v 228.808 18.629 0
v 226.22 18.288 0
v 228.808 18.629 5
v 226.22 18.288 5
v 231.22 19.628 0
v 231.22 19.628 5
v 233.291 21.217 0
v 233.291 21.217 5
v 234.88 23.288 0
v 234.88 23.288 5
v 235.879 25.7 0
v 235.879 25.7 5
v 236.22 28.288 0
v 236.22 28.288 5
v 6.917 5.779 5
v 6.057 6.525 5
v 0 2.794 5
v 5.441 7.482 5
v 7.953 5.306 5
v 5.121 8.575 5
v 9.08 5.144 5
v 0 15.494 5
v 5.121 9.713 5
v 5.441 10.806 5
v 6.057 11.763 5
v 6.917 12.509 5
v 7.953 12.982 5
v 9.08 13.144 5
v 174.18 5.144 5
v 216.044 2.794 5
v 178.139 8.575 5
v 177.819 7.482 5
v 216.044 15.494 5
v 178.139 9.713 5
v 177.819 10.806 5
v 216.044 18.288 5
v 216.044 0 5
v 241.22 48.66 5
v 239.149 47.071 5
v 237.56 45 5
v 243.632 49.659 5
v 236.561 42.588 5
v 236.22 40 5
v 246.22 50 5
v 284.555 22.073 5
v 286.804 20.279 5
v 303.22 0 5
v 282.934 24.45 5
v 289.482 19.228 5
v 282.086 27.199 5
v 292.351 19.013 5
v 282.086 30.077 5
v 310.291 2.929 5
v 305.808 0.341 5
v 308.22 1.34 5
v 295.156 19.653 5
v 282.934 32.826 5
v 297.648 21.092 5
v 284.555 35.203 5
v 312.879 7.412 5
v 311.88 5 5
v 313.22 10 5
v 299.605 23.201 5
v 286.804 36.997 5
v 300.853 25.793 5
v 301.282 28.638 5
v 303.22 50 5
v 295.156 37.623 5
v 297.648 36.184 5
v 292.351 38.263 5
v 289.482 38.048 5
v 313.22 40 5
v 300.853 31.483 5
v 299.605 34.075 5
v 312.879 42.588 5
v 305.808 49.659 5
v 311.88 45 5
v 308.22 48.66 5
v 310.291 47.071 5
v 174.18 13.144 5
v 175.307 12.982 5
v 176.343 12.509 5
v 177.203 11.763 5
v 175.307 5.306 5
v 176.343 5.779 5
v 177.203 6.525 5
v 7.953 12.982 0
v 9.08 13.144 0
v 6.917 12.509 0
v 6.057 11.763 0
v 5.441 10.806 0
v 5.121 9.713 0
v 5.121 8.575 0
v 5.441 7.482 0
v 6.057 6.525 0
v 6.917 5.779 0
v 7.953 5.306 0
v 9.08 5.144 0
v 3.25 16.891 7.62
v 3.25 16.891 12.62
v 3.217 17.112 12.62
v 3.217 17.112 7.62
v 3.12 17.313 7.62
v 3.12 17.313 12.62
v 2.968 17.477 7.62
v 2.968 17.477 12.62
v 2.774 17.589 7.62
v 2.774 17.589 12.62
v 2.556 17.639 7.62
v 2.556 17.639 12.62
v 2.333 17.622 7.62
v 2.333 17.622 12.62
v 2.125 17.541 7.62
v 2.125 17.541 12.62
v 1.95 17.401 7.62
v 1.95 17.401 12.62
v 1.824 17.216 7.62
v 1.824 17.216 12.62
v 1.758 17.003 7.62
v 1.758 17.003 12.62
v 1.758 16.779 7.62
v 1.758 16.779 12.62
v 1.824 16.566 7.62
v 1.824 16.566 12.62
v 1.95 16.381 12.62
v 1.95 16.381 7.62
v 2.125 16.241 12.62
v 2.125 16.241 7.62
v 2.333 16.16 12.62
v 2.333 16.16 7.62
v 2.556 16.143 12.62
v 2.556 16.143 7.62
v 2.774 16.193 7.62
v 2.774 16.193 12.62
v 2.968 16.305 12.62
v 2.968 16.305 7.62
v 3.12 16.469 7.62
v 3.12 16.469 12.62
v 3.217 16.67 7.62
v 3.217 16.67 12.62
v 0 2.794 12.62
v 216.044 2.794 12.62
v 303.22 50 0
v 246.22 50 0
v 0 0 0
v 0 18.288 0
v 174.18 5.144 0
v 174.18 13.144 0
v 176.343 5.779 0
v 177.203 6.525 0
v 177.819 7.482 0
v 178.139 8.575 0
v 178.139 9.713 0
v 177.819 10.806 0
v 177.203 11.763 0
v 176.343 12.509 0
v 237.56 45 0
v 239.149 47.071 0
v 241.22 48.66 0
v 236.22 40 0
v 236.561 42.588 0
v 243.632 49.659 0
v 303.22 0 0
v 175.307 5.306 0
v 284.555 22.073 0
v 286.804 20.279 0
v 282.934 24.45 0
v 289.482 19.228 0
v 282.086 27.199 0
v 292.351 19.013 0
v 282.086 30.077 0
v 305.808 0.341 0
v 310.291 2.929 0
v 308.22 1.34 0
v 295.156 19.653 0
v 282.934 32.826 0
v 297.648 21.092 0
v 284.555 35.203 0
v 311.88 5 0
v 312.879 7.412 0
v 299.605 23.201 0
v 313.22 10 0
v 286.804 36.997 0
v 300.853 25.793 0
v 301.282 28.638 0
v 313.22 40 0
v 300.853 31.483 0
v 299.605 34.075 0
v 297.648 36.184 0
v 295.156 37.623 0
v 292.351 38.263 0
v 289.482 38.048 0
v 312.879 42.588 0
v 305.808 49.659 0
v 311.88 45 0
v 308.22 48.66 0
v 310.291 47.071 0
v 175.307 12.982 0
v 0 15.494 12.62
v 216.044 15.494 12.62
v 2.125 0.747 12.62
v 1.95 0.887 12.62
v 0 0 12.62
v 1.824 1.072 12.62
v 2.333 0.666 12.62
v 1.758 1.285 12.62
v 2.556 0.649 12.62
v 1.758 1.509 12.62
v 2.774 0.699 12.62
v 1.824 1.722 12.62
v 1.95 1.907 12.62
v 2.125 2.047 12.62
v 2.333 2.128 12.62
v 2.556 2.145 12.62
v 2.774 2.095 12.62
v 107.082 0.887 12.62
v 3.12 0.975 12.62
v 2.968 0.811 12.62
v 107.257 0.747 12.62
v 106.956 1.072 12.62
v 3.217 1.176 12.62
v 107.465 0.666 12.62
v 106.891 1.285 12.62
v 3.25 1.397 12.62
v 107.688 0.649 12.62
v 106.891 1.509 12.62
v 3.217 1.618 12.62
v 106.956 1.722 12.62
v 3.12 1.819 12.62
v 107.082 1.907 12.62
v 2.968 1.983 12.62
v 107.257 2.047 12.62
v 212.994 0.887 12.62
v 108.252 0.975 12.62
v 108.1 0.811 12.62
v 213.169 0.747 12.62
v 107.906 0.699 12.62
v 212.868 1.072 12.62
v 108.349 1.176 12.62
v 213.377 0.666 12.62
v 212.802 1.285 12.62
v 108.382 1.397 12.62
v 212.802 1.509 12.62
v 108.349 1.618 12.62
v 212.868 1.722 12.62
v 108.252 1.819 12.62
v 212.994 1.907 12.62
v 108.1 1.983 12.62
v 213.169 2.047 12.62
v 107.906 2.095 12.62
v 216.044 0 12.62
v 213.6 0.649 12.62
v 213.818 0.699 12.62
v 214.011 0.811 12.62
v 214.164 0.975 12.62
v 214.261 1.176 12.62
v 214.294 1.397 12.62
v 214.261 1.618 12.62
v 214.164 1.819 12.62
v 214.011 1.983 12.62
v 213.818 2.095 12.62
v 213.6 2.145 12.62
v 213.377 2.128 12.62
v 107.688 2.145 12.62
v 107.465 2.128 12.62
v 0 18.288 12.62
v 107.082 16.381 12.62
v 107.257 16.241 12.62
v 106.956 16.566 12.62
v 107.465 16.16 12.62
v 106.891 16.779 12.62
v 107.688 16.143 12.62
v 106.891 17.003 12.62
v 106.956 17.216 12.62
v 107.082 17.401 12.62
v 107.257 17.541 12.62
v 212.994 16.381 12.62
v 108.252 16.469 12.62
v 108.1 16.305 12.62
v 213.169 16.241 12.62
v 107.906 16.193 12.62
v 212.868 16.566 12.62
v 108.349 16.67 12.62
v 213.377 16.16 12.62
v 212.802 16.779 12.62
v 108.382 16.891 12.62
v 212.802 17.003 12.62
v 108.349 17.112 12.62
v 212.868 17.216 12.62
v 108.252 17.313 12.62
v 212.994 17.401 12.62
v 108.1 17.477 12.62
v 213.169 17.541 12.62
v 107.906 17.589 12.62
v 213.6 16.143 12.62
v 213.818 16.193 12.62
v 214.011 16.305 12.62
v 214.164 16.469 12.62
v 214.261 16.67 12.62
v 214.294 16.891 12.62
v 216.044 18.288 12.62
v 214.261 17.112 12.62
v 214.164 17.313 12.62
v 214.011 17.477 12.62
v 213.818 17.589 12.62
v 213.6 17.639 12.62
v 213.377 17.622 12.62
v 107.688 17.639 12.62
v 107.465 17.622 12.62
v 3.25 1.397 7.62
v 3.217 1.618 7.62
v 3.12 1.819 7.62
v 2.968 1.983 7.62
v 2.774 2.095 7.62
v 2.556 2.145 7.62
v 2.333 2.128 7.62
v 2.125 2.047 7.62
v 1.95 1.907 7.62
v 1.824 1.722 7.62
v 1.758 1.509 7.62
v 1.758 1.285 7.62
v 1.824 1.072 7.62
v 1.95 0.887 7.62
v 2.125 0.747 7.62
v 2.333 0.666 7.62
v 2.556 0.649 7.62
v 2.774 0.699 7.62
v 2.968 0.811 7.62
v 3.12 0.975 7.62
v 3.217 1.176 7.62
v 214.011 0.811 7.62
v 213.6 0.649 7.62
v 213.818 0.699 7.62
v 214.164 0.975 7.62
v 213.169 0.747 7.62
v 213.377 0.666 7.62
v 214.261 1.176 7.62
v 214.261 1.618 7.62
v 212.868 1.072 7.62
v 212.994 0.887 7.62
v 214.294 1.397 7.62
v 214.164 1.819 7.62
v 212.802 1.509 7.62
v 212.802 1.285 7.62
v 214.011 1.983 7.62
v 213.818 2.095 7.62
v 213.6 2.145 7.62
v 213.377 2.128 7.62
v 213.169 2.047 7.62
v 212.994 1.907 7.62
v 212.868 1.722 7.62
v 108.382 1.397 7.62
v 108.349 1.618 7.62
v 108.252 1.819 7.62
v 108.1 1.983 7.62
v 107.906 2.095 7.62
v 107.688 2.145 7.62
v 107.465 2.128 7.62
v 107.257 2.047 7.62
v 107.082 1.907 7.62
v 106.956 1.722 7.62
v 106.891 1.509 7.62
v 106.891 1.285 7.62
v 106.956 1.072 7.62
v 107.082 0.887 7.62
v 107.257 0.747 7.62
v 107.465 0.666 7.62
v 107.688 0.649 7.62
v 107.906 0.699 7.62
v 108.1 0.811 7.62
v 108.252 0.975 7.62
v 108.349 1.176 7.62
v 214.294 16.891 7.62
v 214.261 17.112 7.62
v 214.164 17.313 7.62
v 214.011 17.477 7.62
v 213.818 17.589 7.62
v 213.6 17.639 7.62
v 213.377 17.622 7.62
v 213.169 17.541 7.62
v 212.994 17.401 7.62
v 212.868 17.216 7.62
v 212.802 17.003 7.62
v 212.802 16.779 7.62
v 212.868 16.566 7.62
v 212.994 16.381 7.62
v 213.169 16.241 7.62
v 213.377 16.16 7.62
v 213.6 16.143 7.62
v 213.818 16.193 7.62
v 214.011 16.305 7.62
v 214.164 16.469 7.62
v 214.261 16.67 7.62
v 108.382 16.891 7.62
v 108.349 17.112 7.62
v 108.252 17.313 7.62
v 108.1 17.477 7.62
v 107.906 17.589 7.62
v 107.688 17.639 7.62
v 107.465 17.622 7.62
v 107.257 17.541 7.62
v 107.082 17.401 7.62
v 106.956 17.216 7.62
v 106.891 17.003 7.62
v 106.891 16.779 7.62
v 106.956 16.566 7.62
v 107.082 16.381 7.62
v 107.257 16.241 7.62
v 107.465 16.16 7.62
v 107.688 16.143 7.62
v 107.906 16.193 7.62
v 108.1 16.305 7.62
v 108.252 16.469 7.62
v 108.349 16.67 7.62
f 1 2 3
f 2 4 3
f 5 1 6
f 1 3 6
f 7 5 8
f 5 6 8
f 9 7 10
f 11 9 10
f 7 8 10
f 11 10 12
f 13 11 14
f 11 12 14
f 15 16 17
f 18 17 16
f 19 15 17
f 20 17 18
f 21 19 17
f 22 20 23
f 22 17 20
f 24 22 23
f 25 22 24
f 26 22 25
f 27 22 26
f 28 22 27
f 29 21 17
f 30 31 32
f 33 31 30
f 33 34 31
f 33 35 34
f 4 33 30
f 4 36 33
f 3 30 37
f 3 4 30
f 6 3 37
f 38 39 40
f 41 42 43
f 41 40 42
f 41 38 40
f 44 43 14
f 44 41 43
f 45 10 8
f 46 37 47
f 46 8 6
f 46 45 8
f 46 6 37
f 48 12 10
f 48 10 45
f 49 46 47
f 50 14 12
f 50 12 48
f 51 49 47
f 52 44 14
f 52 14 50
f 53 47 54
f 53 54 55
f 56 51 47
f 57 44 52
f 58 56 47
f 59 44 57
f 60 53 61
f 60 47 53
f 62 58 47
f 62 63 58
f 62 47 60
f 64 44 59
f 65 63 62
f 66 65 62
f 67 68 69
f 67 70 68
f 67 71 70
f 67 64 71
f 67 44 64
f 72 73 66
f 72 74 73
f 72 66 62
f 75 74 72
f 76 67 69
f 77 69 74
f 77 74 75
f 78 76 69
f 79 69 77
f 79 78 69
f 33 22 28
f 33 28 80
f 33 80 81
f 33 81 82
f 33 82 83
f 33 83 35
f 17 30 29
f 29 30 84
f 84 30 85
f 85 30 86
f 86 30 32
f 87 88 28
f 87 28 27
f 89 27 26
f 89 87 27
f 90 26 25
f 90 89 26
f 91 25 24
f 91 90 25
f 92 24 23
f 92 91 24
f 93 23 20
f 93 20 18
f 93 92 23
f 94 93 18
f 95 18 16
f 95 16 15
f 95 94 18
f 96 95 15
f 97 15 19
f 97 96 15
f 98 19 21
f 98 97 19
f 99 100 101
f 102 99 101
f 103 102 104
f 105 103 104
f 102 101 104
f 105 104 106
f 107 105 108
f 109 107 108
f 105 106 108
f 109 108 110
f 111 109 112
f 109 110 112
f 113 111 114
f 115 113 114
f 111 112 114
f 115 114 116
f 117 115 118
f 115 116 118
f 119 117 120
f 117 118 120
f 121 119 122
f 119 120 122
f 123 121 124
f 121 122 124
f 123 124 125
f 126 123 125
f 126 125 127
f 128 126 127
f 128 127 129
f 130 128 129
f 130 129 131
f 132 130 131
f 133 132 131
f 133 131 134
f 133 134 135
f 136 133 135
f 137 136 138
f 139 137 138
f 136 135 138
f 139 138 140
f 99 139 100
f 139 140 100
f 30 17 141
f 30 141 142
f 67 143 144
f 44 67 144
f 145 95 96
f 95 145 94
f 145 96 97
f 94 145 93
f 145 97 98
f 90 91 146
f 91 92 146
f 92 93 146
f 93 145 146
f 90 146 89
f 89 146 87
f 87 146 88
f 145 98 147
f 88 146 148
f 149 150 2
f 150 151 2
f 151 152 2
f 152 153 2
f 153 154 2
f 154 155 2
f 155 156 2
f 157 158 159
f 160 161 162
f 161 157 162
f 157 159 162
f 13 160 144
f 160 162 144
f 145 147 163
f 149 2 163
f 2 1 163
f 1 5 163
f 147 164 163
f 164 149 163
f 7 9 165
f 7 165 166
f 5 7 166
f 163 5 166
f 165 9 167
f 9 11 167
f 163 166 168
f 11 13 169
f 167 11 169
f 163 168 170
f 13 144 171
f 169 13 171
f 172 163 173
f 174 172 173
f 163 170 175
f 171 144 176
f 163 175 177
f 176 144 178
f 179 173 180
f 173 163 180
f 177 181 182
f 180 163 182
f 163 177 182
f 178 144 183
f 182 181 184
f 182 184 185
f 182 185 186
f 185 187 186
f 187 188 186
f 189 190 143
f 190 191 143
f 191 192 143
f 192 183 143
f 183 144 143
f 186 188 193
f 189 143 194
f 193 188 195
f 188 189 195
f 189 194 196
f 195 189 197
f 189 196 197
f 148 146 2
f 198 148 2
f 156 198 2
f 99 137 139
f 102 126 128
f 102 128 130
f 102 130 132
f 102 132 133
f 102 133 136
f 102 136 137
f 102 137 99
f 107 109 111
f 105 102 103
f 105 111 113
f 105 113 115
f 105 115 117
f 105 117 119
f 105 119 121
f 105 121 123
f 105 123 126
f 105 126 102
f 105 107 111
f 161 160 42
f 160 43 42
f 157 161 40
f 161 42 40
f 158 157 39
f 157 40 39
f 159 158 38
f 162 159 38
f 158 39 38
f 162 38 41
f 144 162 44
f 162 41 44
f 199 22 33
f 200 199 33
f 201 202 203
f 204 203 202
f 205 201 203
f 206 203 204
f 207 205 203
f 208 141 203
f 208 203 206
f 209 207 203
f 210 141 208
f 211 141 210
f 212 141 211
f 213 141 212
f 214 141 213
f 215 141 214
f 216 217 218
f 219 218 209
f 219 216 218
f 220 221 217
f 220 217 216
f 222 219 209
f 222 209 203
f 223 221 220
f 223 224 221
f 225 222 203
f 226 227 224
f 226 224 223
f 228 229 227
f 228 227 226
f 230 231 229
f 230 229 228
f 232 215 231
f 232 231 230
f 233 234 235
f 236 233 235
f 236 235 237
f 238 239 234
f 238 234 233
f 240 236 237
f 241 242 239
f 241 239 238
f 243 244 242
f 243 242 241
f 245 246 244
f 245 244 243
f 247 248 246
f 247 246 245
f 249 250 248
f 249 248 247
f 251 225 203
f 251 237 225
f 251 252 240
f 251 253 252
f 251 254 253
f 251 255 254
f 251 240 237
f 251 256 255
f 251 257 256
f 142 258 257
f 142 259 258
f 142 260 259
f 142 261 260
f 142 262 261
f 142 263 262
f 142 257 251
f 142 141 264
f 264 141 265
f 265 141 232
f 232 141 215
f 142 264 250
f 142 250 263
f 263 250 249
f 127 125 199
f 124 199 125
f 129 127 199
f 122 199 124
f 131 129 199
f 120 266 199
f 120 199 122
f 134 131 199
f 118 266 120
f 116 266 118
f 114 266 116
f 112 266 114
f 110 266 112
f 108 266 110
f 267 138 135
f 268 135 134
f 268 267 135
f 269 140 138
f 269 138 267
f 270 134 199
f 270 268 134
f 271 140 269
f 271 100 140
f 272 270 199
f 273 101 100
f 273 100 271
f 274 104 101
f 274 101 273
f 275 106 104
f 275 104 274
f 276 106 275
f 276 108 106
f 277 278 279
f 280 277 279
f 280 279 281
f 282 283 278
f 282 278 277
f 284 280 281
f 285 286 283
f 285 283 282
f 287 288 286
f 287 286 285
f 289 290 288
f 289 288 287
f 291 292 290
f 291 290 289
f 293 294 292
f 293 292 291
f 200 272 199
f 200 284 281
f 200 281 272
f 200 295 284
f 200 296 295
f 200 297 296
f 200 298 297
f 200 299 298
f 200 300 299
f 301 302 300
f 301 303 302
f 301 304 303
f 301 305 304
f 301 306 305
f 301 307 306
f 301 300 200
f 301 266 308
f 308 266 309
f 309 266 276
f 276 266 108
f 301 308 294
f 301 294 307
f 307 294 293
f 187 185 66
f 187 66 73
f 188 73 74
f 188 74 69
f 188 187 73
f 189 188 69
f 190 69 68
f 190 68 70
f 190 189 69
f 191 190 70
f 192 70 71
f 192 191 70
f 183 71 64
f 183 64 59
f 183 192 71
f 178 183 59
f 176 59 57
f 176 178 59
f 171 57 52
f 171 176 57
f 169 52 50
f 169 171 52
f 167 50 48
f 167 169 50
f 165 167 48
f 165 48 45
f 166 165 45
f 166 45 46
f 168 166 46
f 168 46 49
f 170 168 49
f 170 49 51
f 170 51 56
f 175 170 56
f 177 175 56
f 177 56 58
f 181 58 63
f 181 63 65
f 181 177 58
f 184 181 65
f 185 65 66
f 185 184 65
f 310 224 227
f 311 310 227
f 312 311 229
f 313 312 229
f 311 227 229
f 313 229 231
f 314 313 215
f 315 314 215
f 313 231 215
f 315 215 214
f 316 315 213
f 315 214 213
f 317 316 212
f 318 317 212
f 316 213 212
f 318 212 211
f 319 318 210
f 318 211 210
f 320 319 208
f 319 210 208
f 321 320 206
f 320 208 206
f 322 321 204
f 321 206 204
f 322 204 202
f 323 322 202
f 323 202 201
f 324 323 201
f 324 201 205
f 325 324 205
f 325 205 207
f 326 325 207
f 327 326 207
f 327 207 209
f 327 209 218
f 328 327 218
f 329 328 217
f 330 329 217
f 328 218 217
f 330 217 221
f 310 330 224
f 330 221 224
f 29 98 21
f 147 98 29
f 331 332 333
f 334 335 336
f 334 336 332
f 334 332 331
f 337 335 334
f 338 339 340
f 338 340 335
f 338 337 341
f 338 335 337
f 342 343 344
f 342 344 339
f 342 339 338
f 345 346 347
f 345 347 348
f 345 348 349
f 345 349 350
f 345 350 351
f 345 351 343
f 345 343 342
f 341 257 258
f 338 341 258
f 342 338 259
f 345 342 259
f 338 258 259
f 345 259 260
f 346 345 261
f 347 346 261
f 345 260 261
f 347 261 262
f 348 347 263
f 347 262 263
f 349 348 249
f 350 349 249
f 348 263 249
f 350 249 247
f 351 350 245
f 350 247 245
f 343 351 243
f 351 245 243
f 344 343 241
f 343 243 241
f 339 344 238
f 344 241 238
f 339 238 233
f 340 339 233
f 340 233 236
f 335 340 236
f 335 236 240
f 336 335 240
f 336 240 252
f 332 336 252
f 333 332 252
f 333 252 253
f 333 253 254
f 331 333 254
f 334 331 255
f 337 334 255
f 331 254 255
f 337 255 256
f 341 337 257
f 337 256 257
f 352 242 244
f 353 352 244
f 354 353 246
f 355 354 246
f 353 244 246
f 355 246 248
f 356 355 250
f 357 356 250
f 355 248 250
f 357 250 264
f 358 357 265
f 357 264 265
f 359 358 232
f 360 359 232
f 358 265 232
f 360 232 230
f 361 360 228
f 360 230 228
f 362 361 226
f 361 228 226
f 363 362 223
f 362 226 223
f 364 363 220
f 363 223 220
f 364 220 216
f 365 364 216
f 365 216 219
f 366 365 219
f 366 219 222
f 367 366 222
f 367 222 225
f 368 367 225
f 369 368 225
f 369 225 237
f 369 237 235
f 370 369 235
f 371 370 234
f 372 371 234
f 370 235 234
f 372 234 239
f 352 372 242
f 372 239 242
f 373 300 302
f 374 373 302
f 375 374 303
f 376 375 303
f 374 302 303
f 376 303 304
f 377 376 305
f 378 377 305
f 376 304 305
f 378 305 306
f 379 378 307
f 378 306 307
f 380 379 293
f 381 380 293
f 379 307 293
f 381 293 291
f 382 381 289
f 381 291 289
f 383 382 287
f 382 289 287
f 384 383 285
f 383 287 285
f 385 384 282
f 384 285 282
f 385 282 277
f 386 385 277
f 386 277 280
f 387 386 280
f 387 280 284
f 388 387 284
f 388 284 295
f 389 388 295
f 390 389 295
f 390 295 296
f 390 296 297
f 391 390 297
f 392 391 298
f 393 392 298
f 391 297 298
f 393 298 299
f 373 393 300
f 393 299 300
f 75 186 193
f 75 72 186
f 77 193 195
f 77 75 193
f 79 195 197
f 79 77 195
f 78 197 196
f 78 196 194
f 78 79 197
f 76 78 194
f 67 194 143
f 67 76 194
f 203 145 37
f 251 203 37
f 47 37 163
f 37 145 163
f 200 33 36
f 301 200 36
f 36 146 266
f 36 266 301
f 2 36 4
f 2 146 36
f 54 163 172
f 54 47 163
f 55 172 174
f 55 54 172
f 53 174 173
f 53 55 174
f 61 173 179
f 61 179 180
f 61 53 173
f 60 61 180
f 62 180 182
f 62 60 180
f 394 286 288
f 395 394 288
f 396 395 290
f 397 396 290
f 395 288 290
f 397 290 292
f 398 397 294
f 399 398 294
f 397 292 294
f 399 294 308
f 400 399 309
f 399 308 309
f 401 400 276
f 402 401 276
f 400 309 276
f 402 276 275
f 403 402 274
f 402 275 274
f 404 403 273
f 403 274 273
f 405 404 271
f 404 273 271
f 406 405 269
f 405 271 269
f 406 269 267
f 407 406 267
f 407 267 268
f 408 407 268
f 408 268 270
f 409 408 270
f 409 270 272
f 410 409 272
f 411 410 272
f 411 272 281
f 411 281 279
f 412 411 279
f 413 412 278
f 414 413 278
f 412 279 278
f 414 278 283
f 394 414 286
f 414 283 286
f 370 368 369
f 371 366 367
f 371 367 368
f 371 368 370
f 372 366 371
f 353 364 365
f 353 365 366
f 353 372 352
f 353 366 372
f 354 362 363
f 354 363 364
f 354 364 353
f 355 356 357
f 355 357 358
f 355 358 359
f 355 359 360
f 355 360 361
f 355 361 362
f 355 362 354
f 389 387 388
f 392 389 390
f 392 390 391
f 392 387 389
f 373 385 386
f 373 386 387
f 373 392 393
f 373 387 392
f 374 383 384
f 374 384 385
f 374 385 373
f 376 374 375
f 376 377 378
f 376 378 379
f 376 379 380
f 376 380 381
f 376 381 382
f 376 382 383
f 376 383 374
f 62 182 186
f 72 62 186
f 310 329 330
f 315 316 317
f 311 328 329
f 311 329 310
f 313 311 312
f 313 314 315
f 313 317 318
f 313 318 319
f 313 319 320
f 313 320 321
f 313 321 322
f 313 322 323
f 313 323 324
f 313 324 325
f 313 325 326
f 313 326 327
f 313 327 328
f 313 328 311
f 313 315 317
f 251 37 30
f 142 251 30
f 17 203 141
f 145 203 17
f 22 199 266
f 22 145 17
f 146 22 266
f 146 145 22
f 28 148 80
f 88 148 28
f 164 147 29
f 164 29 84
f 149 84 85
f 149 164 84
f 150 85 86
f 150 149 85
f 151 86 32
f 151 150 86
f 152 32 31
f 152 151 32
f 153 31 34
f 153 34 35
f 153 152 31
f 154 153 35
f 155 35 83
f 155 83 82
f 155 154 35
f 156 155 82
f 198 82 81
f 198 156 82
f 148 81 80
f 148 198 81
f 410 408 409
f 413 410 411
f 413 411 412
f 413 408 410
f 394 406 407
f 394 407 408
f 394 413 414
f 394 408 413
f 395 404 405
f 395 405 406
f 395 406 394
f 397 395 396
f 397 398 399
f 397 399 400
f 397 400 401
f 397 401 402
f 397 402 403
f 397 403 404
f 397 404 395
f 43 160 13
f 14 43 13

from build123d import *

# Parameters (mm, degrees)
SKETCH1_W           = 236.22
SKETCH1_H           = 18.288
SKETCH1_R           = 9.652
BOSS_EXTRUDE1_DEPTH = 5
FILLET1_R           = 10
SKETCH2_W           = 216.043861244
SKETCH2_H           = 2.794
BOSS_EXTRUDE2_DEPTH = 7.62
SKETCH3_R           = 0.75
CUT_EXTRUDE1_DEPTH  = 5


with BuildPart() as part:
    # Sketch1 → Boss-Extrude1 (new body)
    with BuildSketch(Plane.XY):
        with Locations((118.11, 9.144)):
            Rectangle(SKETCH1_W, SKETCH1_H)
        with BuildLine():
            ThreePointArc((174.18, 5.144), (178.18, 9.144), (174.18, 13.144))
            Line((174.18, 13.144), (9.08, 13.144))
            ThreePointArc((9.08, 13.144), (5.08, 9.144), (9.08, 5.144))
            Line((9.08, 5.144), (174.18, 5.144))
        make_face(mode=Mode.SUBTRACT)
        Polygon((236.22, 18.288), (236.22, 0), (313.22, 0), (313.22, 50), (236.22, 50), align=None)
        with Locations((291.63, 28.638)):
            Circle(SKETCH1_R, mode=Mode.SUBTRACT)
    extrude(amount=BOSS_EXTRUDE1_DEPTH)

    # Fillet1
    fillet1_edges = [part.edges().sort_by_distance(p)[0] for p in [
        (236.22, 18.288, 2.5),
        (236.22, 50, 2.5),
        (313.22, 50, 2.5),
        (313.22, 0, 2.5),
    ]]
    fillet(fillet1_edges, radius=FILLET1_R)

    # Sketch2 → Boss-Extrude2 (add)
    with BuildSketch(Plane.XY.offset(5)):
        with Locations((108.021930622, 16.891)):
            Rectangle(SKETCH2_W, SKETCH2_H)
        with Locations((108.021930622, 1.397)):
            Rectangle(SKETCH2_W, SKETCH2_H)
    extrude(amount=BOSS_EXTRUDE2_DEPTH)

    # Sketch3 → Cut-Extrude1 (cut)
    with BuildSketch(Plane.XY.offset(12.62)):
        with Locations((2.5, 16.891)):
            Circle(SKETCH3_R)
        with Locations((2.5, 1.397)):
            Circle(SKETCH3_R)
        with Locations((107.6321922, 16.891)):
            Circle(SKETCH3_R)
        with Locations((107.6321922, 1.397)):
            Circle(SKETCH3_R)
        with Locations((213.543861244, 16.891)):
            Circle(SKETCH3_R)
        with Locations((213.543861244, 1.397)):
            Circle(SKETCH3_R)
    extrude(amount=-CUT_EXTRUDE1_DEPTH, mode=Mode.SUBTRACT)


solid = part.part
